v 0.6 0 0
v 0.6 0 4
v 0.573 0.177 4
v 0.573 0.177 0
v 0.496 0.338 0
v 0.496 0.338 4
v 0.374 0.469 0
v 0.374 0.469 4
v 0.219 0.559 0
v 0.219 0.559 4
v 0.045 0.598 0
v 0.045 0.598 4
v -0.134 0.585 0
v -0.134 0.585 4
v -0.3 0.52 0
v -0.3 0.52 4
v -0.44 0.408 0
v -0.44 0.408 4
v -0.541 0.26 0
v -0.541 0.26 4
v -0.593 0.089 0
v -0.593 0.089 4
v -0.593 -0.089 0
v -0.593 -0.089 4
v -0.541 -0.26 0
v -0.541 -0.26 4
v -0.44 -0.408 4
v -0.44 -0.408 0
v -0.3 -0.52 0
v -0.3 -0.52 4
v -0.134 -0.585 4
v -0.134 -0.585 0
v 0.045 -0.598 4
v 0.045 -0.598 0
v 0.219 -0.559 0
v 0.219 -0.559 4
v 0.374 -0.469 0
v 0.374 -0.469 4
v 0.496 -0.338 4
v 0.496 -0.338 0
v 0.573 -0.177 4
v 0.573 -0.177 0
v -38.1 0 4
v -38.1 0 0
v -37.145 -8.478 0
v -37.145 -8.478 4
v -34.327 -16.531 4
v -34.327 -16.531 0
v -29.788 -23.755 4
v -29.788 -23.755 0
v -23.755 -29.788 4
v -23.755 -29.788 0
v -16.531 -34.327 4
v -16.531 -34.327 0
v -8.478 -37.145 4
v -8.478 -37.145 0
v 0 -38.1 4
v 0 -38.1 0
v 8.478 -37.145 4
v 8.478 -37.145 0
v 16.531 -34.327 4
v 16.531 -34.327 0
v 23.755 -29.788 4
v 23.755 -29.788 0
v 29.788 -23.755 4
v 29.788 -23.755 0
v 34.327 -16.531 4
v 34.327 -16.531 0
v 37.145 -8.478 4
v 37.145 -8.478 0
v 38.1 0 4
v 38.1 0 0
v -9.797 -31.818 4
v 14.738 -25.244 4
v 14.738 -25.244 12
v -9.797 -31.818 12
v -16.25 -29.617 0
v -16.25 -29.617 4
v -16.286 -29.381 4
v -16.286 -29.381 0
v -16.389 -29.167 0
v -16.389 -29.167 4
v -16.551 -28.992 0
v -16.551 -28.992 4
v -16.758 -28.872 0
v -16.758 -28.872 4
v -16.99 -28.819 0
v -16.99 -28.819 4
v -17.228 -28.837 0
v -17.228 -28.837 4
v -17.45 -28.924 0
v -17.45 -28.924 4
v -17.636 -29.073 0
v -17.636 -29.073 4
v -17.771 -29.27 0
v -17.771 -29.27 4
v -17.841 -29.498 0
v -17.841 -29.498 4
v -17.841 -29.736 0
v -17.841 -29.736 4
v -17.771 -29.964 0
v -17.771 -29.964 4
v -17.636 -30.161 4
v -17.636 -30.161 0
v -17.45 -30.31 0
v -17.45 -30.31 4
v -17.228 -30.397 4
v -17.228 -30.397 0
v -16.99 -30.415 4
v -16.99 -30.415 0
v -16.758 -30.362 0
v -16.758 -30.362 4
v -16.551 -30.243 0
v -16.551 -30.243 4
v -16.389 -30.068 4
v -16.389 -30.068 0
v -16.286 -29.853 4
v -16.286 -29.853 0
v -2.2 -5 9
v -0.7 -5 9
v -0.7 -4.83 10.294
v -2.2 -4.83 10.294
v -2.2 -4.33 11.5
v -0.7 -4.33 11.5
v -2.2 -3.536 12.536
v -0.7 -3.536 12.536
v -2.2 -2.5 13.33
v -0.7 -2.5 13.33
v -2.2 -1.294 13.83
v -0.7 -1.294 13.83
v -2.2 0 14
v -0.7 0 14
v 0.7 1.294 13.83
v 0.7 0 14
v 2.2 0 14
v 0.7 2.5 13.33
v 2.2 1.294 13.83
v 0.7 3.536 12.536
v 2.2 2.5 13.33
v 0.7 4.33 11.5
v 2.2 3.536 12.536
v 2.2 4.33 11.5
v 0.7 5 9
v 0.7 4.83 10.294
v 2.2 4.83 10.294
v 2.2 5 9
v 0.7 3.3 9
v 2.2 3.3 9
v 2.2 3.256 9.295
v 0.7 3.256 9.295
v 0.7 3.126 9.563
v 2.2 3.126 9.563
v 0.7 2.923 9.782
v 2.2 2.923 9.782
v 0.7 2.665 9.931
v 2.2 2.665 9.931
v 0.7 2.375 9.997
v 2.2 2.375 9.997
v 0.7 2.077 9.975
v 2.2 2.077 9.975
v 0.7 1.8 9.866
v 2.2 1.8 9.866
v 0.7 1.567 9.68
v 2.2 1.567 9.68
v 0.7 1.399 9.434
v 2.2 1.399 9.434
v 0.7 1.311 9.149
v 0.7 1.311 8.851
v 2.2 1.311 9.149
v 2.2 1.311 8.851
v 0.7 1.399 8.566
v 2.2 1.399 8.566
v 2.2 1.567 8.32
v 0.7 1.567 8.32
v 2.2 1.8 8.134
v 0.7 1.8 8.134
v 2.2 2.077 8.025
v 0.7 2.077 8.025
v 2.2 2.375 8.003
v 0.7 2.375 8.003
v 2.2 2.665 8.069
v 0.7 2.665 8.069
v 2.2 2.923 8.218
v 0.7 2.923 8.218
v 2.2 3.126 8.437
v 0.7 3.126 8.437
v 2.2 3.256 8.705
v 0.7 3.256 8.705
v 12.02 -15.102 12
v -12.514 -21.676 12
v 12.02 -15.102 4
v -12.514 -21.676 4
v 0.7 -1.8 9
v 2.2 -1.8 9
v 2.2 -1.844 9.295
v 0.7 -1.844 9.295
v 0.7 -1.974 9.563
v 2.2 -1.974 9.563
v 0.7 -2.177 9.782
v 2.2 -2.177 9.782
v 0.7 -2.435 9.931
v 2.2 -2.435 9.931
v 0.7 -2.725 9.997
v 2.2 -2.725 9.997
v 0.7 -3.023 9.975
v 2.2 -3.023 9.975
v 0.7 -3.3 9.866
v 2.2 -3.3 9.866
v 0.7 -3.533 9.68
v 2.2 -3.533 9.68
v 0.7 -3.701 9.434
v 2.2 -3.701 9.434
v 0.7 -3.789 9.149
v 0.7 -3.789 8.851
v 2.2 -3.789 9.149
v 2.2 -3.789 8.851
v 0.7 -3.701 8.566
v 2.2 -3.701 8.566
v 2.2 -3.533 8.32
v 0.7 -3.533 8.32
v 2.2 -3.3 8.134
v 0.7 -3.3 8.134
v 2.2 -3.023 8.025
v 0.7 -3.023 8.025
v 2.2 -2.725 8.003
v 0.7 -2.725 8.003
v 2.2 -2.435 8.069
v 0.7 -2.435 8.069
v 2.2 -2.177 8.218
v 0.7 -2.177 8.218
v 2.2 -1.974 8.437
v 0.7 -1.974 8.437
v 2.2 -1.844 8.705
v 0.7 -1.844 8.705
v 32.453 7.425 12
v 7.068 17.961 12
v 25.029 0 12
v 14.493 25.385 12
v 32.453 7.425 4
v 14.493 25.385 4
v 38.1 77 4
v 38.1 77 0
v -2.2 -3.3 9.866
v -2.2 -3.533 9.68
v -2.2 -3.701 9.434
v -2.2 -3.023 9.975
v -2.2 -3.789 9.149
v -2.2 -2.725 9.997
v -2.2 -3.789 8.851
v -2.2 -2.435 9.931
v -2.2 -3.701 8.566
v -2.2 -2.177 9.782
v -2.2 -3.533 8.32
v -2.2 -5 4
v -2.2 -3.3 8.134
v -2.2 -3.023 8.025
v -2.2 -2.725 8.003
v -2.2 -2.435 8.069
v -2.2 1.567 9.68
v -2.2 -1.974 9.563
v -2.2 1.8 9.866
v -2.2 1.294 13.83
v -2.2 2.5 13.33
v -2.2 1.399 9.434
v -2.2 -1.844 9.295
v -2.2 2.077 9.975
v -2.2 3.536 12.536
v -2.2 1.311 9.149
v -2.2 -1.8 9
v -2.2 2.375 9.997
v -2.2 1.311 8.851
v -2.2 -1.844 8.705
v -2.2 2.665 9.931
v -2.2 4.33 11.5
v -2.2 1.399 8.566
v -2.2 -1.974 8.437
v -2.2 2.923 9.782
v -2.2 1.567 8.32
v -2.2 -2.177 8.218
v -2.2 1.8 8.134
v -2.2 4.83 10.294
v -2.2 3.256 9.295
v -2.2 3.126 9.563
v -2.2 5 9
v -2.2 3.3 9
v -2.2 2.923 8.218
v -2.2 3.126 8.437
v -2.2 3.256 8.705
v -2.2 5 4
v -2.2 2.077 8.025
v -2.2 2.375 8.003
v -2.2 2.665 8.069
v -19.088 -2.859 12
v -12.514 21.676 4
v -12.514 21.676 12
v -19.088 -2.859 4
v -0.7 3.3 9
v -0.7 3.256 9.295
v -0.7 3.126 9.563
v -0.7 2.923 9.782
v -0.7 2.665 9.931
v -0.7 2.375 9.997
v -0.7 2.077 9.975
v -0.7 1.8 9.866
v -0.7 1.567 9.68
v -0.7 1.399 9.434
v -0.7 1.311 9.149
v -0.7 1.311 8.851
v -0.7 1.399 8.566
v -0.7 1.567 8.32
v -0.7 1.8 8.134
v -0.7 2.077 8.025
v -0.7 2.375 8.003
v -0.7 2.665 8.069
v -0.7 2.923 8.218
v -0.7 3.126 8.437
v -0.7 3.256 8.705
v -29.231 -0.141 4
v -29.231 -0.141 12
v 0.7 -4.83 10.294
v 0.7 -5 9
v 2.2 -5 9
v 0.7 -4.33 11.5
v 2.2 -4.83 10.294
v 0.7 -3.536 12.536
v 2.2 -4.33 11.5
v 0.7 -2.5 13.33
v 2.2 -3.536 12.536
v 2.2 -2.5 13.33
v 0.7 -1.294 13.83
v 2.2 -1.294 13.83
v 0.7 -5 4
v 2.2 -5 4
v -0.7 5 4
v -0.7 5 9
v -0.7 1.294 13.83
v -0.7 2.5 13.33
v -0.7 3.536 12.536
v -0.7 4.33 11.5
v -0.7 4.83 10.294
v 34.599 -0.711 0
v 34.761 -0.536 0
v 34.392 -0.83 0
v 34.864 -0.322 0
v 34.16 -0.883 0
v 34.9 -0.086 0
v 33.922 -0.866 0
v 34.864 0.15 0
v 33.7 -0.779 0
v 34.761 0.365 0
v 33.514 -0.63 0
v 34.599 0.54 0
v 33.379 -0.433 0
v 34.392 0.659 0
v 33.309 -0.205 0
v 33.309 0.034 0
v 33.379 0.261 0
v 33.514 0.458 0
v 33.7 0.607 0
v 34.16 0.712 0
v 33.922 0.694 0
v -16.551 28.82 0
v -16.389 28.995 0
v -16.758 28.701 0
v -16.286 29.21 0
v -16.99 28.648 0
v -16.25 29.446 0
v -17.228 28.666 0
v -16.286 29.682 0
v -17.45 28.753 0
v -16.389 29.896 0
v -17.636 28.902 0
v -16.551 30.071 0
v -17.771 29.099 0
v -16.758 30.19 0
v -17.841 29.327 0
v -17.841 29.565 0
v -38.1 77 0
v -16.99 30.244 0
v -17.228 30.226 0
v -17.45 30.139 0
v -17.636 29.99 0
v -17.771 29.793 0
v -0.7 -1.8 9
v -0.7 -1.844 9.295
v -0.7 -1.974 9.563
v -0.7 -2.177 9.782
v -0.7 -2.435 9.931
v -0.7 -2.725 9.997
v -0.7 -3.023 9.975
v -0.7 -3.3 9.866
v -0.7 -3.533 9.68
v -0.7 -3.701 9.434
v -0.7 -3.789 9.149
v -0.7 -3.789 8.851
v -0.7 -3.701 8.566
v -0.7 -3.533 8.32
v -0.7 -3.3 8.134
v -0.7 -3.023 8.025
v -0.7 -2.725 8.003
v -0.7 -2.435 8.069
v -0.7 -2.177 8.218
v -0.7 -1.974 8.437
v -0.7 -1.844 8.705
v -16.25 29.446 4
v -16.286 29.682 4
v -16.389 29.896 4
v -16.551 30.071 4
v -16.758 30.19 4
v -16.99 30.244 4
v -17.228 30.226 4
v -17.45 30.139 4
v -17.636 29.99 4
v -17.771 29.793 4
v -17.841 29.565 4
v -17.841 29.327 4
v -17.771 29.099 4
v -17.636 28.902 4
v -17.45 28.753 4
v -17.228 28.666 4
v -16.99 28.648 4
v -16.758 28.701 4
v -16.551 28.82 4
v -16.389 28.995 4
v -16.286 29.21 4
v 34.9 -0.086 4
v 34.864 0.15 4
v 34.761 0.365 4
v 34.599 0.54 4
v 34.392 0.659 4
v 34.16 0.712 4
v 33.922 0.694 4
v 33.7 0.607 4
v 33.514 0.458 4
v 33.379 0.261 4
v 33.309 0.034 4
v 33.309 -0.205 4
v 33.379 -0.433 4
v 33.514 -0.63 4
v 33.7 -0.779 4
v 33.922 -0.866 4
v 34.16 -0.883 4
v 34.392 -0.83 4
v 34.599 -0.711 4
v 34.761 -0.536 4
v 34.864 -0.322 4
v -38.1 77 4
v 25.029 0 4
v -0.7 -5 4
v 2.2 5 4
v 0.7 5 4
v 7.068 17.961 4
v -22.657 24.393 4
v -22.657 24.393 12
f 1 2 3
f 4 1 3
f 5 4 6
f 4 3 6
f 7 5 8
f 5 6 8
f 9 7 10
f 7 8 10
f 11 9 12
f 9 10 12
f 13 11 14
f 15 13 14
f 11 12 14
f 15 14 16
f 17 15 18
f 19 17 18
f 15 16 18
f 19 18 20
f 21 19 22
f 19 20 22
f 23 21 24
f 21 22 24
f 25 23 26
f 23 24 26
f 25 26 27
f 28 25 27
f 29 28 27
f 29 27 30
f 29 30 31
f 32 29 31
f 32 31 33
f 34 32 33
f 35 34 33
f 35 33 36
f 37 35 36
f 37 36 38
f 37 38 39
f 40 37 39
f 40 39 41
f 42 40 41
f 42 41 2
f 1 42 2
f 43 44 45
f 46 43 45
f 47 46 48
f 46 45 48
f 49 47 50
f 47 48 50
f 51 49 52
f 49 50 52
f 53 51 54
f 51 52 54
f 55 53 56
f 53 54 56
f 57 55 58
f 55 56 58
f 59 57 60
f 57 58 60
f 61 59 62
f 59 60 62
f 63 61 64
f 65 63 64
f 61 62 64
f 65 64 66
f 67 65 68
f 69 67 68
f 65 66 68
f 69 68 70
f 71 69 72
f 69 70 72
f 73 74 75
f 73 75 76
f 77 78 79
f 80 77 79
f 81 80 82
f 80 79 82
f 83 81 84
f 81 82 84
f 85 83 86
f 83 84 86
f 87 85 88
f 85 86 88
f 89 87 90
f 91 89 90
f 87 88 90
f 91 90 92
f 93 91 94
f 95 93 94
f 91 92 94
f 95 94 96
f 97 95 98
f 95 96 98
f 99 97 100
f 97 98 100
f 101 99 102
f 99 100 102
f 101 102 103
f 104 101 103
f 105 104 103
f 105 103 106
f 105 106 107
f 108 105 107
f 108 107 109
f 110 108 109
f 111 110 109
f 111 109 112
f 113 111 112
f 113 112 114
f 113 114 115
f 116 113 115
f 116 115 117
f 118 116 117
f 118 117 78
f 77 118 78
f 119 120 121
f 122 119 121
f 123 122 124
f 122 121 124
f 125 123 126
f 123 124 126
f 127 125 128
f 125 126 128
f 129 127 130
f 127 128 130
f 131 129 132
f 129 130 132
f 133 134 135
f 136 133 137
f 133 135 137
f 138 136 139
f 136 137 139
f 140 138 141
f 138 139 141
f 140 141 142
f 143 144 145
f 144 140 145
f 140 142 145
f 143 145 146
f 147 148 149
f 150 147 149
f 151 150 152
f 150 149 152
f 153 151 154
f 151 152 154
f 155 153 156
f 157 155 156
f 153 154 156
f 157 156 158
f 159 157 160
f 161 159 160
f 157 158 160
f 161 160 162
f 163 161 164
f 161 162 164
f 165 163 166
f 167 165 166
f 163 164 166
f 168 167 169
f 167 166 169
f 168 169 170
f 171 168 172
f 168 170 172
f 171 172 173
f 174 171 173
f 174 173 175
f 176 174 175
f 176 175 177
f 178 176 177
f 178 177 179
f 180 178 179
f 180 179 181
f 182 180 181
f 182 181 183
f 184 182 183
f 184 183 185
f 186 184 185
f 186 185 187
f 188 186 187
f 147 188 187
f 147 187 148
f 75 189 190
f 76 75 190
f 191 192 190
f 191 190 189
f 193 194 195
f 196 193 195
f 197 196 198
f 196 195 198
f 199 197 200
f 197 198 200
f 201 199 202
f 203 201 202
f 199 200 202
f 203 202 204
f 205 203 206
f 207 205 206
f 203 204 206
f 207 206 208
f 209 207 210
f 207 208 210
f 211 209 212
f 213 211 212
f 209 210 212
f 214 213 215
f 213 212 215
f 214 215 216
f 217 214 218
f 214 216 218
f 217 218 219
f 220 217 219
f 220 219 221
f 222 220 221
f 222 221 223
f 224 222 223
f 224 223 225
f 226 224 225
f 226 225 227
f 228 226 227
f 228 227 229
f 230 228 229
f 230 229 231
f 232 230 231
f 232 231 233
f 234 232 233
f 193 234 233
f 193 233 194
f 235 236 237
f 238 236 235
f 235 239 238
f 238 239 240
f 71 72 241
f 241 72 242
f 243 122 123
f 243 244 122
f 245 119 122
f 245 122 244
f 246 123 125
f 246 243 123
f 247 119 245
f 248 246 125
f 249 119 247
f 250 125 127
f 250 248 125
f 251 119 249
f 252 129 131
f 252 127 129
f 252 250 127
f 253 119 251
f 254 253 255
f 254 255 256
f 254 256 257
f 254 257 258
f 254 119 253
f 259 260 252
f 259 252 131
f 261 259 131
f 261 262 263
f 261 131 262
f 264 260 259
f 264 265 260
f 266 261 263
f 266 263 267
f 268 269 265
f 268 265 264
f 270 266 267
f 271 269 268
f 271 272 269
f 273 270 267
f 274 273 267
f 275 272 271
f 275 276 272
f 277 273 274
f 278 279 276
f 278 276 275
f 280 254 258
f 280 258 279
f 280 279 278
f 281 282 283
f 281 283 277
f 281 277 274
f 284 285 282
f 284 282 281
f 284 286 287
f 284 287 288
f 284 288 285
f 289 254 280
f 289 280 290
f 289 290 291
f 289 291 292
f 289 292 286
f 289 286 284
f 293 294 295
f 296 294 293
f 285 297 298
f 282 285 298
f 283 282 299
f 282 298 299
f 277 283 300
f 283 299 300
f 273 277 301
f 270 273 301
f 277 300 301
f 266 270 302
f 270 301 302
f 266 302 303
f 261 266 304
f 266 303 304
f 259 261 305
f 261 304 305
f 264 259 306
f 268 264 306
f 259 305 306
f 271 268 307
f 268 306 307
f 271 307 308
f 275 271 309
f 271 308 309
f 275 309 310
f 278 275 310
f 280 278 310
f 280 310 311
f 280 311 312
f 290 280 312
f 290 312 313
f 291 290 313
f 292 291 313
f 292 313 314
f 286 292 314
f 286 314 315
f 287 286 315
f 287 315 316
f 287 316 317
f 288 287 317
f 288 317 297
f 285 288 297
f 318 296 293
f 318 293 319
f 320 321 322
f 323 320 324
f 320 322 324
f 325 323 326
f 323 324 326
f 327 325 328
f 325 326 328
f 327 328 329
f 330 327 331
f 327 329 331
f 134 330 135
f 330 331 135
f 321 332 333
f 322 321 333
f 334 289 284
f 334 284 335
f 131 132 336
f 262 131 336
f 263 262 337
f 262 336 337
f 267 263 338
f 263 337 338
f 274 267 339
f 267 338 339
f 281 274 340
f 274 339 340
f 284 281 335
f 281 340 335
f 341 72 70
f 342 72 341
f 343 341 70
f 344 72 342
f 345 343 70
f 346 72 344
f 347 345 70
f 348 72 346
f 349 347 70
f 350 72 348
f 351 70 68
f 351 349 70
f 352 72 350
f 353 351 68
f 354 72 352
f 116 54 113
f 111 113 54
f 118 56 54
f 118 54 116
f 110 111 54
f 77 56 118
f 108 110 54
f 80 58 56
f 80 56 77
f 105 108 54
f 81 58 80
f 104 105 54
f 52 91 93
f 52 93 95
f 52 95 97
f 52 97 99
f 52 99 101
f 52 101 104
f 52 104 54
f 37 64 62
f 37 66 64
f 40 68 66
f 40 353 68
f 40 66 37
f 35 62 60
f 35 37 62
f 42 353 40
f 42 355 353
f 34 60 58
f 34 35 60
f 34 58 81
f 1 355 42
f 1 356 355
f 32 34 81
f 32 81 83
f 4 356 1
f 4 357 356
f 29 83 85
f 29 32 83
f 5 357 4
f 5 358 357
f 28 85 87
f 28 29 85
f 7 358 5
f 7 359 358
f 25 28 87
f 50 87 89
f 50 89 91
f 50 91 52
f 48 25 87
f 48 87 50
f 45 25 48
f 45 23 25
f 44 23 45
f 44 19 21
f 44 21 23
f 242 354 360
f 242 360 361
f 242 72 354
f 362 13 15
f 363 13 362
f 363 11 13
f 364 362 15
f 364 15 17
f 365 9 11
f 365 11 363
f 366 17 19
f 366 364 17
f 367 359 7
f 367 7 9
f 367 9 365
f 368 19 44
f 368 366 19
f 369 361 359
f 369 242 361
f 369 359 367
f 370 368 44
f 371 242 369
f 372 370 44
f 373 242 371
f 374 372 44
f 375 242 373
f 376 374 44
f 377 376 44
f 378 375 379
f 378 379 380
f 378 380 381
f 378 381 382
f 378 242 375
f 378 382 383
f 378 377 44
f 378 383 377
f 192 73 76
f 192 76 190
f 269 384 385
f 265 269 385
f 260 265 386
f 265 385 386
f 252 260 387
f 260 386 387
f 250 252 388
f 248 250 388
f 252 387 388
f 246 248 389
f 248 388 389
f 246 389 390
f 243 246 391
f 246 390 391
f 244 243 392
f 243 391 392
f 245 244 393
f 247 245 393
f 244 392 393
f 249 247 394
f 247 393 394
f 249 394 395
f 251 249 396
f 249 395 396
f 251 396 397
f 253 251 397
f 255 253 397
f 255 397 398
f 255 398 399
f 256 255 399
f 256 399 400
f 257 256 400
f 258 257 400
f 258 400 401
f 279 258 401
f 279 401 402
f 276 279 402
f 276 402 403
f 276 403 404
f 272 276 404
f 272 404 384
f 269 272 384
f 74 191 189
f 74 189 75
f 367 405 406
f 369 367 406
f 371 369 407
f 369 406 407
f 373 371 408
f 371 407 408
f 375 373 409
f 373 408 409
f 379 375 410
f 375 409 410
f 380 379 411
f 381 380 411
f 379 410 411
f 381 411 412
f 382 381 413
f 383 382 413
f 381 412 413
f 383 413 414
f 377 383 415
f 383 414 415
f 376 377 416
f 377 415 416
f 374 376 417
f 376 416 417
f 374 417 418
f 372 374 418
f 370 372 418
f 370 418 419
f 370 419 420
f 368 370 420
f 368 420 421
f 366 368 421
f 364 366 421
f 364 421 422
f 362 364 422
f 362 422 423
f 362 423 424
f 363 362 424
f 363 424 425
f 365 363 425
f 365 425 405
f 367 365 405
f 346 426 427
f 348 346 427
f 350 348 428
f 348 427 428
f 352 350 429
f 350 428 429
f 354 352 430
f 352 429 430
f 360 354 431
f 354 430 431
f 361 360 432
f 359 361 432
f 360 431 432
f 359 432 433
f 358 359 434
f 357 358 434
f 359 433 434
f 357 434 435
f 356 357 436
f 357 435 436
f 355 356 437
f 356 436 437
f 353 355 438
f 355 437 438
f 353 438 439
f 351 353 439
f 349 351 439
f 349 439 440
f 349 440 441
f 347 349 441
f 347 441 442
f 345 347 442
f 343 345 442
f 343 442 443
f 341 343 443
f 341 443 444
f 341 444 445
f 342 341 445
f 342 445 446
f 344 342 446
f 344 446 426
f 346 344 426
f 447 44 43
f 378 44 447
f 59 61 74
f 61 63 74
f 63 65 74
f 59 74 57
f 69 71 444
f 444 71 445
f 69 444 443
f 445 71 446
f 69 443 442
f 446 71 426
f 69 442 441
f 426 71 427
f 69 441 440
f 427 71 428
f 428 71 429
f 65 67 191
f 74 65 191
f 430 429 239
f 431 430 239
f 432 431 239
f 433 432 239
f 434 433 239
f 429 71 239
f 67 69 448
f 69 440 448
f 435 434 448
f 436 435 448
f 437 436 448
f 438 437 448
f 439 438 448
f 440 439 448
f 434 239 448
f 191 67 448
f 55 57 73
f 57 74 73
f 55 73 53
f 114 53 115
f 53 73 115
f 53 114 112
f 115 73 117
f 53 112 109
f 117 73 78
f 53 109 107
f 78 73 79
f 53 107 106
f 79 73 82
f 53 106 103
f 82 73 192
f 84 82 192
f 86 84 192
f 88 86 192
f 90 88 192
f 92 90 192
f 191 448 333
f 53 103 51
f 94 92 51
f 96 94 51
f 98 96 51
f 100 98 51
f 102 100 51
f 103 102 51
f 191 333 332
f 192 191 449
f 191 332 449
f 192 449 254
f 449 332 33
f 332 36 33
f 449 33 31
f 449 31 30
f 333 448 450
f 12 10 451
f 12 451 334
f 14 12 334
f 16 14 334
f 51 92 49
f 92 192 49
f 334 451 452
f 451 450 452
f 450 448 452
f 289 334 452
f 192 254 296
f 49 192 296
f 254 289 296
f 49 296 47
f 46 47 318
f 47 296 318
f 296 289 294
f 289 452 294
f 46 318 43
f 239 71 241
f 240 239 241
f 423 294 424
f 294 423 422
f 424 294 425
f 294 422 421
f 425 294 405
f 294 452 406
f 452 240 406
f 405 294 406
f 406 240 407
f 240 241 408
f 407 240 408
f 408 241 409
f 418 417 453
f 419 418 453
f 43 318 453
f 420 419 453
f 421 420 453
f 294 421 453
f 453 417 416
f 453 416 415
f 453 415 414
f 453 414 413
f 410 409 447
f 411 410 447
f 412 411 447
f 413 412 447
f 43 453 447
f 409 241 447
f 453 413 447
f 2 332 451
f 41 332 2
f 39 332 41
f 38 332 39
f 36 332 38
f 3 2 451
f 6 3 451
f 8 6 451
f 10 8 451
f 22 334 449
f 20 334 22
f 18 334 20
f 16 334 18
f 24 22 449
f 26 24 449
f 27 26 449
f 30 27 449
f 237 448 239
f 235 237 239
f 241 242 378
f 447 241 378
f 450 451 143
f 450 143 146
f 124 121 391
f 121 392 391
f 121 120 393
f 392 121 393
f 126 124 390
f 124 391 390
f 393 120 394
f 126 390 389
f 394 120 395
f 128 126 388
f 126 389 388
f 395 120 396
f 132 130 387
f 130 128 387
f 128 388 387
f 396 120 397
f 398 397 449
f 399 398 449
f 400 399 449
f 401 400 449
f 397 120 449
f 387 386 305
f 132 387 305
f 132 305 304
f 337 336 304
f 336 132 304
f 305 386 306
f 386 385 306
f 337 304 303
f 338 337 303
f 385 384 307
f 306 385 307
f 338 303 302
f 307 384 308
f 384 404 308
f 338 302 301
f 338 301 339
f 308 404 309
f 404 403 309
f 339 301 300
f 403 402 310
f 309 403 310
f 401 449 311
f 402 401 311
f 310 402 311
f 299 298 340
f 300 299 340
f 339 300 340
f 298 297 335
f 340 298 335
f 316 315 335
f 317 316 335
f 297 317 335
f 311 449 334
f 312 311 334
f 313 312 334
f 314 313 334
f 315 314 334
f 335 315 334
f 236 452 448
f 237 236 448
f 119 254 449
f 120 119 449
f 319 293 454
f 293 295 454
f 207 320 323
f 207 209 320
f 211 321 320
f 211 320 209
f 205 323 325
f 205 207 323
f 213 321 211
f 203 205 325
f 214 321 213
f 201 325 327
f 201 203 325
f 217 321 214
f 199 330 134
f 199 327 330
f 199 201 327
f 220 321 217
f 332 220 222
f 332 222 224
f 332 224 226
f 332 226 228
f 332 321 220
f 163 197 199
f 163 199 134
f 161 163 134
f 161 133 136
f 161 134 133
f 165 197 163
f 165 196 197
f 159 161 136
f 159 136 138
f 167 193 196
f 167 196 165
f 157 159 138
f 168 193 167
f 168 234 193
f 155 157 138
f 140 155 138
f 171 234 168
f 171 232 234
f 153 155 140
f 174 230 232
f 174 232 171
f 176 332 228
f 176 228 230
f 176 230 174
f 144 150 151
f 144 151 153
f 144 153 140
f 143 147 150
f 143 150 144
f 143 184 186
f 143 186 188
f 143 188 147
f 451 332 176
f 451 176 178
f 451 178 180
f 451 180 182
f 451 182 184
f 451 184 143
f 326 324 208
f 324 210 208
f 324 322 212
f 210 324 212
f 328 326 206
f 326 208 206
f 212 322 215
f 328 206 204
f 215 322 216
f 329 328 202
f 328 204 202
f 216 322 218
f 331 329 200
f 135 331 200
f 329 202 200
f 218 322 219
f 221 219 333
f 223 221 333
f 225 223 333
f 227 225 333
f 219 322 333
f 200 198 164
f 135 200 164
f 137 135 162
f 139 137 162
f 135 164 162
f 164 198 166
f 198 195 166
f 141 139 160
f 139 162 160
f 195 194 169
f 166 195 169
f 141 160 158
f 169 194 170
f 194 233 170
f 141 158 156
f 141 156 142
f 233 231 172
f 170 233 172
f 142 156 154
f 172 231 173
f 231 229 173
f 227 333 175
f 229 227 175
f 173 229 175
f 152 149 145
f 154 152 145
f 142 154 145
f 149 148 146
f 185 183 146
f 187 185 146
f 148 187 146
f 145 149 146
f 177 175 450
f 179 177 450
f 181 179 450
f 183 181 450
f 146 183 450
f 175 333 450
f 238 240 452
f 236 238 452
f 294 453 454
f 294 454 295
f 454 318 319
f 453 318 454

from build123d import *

# Parameters (mm, degrees)
SKETCH2_R           = 38.1
BOSS_EXTRUDE1_DEPTH = 4
SKETCH11_W          = 76.2
SKETCH11_H          = 77
BOSS_EXTRUDE4_DEPTH = 4
SKETCH3_R           = 0.8
CUT_EXTRUDE1_DEPTH  = 6
SKETCH4_R           = 0.6
CUT_EXTRUDE2_DEPTH  = 6
SKETCH5_W           = 1.5
SKETCH5_H           = 10
BOSS_EXTRUDE2_DEPTH = 10
CUT_EXTRUDE3_DEPTH  = 89.028915704
SKETCH7_R           = 1
CUT_EXTRUDE4_DEPTH  = 89.028915704
BOSS_EXTRUDE3_DEPTH = 8


with BuildPart() as part:
    # Sketch2 → Boss-Extrude1 (new body)
    with BuildSketch(Plane.XY):
        Circle(SKETCH2_R)
    extrude(amount=BOSS_EXTRUDE1_DEPTH)

    # Sketch11 → Boss-Extrude4 (add)
    with BuildSketch(Plane(origin=(0, 0, 0), x_dir=(-1, 0, 0), z_dir=(0, 0, -1))):
        with Locations((0, 38.5)):
            Rectangle(SKETCH11_W, SKETCH11_H)
    extrude(amount=-BOSS_EXTRUDE4_DEPTH)

    # Sketch3 → Cut-Extrude1 (cut)
    with BuildSketch(Plane.XY.offset(4)):
        with Locations((34.1, -0.085721815)):
            Circle(SKETCH3_R)
        with Locations((-17.05, -29.617188084)):
            Circle(SKETCH3_R)
        with Locations((-17.05, 29.445744454)):
            Circle(SKETCH3_R)
    extrude(amount=-CUT_EXTRUDE1_DEPTH, mode=Mode.SUBTRACT)

    # Sketch4 → Cut-Extrude2 (cut)
    with BuildSketch(Plane.XY.offset(4)):
        Circle(SKETCH4_R)
    extrude(amount=-CUT_EXTRUDE2_DEPTH, mode=Mode.SUBTRACT)

    # Sketch5 → Boss-Extrude2 (add)
    with BuildSketch(Plane.XY.offset(4)):
        with Locations((1.45, 0)):
            Rectangle(SKETCH5_W, SKETCH5_H)
        with Locations((-1.45, 0)):
            Rectangle(SKETCH5_W, SKETCH5_H)
    extrude(amount=BOSS_EXTRUDE2_DEPTH)

    # Sketch6 → Cut-Extrude3 (cut, through all)
    with BuildSketch(Plane(origin=(2.2, 0, 0), x_dir=(0, 0, -1), z_dir=(1, 0, 0))):
        with BuildLine():
            ThreePointArc((-14, 0), (-12.535533906, 3.535533906), (-9, 5))
            Line((-9, 5), (-14, 5))
            Line((-14, 5), (-14, 0))
        make_face()
        with BuildLine():
            ThreePointArc((-9, -5), (-12.535533906, -3.535533906), (-14, 0))
            Line((-14, 0), (-14, -5))
            Line((-14, -5), (-9, -5))
        make_face()
    extrude(amount=-CUT_EXTRUDE3_DEPTH, mode=Mode.SUBTRACT)

    # Sketch7 → Cut-Extrude4 (cut, through all)
    with BuildSketch(Plane(origin=(2.2, 0, 0), x_dir=(0, 0, -1), z_dir=(1, 0, 0))):
        with Locations(Location((-9, 2.3, 0), (0, 0, 90))):
            Circle(SKETCH7_R)
        with Locations(Location((-9, -2.8, 0), (0, 0, 90))):
            Circle(SKETCH7_R)
    extrude(amount=-CUT_EXTRUDE4_DEPTH, mode=Mode.SUBTRACT)

    # Sketch8 → Boss-Extrude3 (add)
    with BuildSketch(Plane.XY.offset(4)):
        Polygon((25.028792455, 0), (32.453413657, 7.424621202), (14.492901415, 25.385133445), (7.068280213, 17.960512242), align=None)
        Polygon((12.02011976, -15.101566346), (14.737719734, -25.243787522), (-9.796796254, -31.817791268), (-12.514396227, -21.675570092), align=None)
        Polygon((-19.088399973, -2.858945896), (-29.230621149, -0.141345922), (-22.656617403, 24.393170065), (-12.514396227, 21.675570092), align=None)
    extrude(amount=BOSS_EXTRUDE3_DEPTH)


solid = part.part
